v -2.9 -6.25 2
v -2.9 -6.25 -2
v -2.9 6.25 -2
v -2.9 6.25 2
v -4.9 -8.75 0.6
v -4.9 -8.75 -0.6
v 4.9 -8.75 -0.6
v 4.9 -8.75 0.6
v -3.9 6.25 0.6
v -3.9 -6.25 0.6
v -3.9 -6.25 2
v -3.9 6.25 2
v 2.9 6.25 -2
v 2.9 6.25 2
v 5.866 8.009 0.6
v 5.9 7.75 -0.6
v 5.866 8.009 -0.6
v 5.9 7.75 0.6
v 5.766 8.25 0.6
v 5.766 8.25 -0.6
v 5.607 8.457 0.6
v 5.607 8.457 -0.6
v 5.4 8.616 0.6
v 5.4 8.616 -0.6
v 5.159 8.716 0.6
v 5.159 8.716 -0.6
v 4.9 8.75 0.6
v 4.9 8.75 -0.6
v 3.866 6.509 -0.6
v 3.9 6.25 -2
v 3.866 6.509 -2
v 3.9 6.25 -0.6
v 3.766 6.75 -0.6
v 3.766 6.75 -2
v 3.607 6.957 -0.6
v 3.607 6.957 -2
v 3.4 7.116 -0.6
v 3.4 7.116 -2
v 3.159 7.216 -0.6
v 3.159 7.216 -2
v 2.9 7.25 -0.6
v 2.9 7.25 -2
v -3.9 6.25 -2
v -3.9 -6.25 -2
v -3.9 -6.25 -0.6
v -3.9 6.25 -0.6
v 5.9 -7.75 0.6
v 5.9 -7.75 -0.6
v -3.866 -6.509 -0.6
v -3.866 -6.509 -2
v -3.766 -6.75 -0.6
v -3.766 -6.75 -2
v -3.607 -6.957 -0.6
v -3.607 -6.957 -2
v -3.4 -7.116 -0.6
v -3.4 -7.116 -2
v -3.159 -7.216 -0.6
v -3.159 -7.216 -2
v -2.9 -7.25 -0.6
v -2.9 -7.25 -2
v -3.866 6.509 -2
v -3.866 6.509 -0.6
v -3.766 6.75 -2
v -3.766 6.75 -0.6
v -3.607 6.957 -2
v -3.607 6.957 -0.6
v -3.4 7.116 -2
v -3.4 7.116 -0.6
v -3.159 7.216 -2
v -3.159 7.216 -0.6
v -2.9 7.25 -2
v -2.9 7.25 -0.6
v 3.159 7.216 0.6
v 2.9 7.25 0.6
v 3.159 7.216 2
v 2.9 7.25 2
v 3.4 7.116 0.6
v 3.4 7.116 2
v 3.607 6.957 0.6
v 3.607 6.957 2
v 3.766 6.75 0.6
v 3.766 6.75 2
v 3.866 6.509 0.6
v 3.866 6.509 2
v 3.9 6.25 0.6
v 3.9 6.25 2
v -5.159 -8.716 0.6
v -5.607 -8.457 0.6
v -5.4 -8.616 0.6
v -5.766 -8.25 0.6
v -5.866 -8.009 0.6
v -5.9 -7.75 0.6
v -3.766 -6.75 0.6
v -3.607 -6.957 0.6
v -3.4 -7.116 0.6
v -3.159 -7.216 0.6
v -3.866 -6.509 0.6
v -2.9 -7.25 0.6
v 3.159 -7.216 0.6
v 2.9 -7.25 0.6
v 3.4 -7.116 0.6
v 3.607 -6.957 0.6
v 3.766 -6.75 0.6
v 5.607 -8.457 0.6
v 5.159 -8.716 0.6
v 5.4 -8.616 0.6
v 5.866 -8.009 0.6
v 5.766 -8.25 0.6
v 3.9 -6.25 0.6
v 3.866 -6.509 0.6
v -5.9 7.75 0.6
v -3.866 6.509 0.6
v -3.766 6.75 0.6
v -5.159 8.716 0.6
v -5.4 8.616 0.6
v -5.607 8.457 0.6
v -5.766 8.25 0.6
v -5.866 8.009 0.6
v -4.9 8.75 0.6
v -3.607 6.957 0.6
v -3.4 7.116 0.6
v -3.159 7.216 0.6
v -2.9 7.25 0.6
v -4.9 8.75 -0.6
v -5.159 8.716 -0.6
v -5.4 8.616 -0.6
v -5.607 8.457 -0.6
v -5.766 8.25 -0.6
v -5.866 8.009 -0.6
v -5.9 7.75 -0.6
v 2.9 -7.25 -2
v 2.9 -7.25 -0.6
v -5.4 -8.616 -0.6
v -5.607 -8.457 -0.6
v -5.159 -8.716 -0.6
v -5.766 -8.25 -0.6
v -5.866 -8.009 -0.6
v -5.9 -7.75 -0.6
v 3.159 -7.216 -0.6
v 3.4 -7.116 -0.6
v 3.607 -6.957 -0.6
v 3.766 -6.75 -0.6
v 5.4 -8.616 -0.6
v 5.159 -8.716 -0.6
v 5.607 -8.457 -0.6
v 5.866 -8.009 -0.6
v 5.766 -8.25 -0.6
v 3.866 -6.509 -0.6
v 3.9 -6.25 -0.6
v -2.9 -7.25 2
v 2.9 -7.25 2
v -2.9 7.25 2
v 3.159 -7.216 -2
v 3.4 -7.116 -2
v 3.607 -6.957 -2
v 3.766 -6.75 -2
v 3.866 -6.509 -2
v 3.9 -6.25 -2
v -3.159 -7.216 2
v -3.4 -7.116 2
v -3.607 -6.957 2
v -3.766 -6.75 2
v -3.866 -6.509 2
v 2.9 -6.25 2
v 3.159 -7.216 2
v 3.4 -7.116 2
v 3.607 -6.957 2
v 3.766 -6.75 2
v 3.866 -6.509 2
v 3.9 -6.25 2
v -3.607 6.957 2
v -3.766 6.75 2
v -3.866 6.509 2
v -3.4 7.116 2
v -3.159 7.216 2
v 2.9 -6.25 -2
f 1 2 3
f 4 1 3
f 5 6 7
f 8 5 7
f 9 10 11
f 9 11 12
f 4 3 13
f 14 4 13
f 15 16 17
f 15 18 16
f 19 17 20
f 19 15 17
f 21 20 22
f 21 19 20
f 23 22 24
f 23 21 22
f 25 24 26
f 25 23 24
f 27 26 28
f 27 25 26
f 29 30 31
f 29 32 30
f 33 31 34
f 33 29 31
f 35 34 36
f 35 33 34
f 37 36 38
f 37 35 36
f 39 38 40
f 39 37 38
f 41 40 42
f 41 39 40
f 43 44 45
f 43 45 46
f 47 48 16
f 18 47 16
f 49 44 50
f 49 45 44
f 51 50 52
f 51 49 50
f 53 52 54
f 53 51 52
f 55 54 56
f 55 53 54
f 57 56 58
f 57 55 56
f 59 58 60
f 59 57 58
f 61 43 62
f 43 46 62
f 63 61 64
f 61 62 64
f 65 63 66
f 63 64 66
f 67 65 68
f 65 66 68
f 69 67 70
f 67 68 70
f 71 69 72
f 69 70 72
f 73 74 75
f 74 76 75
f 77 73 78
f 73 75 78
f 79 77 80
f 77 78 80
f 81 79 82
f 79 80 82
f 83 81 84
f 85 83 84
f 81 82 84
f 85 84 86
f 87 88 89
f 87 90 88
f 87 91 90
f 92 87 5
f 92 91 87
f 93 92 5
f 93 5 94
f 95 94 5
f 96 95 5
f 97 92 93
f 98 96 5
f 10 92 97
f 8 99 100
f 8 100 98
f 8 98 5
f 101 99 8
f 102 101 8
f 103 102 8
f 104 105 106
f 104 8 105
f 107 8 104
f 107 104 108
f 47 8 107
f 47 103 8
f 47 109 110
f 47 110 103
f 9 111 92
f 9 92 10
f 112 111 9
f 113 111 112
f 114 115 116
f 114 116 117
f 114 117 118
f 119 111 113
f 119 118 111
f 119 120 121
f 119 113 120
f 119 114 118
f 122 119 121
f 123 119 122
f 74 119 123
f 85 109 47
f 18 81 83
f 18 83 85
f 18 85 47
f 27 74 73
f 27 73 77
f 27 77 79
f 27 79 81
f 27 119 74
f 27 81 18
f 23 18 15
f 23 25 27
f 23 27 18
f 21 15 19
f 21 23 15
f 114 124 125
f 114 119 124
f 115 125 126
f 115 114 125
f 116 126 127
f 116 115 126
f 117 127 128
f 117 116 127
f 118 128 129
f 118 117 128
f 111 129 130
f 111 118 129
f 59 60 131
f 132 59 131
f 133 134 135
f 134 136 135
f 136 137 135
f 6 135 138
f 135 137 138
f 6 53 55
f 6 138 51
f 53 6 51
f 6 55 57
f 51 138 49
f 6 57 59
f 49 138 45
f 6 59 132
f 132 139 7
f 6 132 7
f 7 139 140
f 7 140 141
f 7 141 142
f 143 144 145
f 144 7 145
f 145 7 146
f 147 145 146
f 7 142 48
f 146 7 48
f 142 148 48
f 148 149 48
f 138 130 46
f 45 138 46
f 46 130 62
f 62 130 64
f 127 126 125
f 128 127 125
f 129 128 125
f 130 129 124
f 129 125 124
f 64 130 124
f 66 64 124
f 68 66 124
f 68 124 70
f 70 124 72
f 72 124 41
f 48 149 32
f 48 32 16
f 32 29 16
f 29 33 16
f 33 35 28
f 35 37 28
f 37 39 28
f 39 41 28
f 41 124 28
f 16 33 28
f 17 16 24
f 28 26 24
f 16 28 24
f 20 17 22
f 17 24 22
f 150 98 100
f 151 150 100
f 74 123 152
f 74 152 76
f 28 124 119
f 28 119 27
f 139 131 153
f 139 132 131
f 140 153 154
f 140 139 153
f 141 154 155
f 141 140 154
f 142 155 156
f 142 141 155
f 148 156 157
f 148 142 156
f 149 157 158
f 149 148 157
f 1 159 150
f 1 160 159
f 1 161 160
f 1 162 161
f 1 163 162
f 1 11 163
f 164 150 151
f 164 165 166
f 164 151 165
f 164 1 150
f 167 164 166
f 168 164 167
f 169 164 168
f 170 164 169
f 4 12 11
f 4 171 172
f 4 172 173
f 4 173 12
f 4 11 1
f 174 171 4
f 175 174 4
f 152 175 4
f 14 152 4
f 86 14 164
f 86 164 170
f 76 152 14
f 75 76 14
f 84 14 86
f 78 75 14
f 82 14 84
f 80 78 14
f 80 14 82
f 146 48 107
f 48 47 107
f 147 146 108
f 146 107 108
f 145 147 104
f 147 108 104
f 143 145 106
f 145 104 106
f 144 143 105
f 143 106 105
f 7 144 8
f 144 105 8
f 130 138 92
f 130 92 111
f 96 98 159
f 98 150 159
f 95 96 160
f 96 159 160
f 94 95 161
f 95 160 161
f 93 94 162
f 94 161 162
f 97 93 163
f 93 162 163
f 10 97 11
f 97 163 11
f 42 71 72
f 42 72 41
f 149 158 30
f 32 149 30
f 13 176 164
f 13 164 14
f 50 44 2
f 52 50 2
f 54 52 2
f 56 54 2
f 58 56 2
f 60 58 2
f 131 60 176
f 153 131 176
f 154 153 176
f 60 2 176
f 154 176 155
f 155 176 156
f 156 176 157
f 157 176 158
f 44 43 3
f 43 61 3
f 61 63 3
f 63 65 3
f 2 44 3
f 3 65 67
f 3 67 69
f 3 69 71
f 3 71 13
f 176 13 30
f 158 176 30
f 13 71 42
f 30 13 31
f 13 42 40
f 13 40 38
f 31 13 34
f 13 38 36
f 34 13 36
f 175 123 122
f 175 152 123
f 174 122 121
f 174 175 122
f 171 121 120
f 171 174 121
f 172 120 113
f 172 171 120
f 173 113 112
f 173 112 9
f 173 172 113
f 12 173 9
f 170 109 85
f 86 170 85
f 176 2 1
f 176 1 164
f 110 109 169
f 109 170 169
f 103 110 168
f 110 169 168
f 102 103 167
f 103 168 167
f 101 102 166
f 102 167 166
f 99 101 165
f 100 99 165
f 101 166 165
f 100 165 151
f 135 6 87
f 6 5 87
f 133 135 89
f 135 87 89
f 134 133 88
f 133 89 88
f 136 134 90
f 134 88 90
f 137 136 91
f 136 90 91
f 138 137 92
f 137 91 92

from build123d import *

# Parameters (mm, degrees)
BOSS_EXTRUDE1_DEPTH      = 0.6
BOSS_EXTRUDE1_DEPTH_BACK = 0.6
SKETCH1_W                = 11.8
SKETCH1_H                = 17.5
BOSS_EXTRUDE2_DEPTH      = 2
BOSS_EXTRUDE2_DEPTH_BACK = 2
SKETCH1_3_W              = 7.8
SKETCH1_3_H              = 14.5
SKETCH1_3_W_2            = 5.8
SKETCH1_3_H_2            = 12.5
CUT_EXTRUDE1_DEPTH       = 11.741159155
CUT_EXTRUDE1_DEPTH_BACK  = 11.741159155
SKETCH1_4_W              = 5.8
SKETCH1_4_H              = 12.5
FILLET1_R                = 1


with BuildPart() as part:
    # Sketch1 → Boss-Extrude1 (new, two sides: drawn at the far end of the back side and taken through both)
    with BuildSketch(Plane.XY.offset(-BOSS_EXTRUDE1_DEPTH_BACK)):
        Rectangle(SKETCH1_W, SKETCH1_H)
    extrude(amount=BOSS_EXTRUDE1_DEPTH + BOSS_EXTRUDE1_DEPTH_BACK)

    # Sketch1<3> → Boss-Extrude2 (add, two sides: drawn at the far end of the back side and taken through both)
    with BuildSketch(Plane.XY.offset(-BOSS_EXTRUDE2_DEPTH_BACK)):
        Rectangle(SKETCH1_3_W, SKETCH1_3_H)
        Rectangle(SKETCH1_3_W_2, SKETCH1_3_H_2, mode=Mode.SUBTRACT)
    extrude(amount=BOSS_EXTRUDE2_DEPTH + BOSS_EXTRUDE2_DEPTH_BACK)

    # Sketch1<4> → Cut-Extrude1 (cut, two sides: drawn at the far end of the back side and taken through both)
    with BuildSketch(Plane.XY.offset(-CUT_EXTRUDE1_DEPTH_BACK)):
        Rectangle(SKETCH1_4_W, SKETCH1_4_H)
    extrude(amount=CUT_EXTRUDE1_DEPTH + CUT_EXTRUDE1_DEPTH_BACK, mode=Mode.SUBTRACT)

    # Fillet1
    fillet1_edges = [part.edges().sort_by_distance(p)[0] for p in [
        (-3.9, -7.25, -1.3),
        (-3.9, 7.25, -1.3),
        (3.9, 7.25, -1.3),
        (3.9, -7.25, -1.3),
        (-3.9, -7.25, 1.3),
        (-3.9, 7.25, 1.3),
        (3.9, 7.25, 1.3),
        (3.9, -7.25, 1.3),
        (-5.9, 8.75, 0),
        (5.9, 8.75, 0),
        (5.9, -8.75, 0),
        (-5.9, -8.75, 0),
    ]]
    fillet(fillet1_edges, radius=FILLET1_R)


solid = part.part
